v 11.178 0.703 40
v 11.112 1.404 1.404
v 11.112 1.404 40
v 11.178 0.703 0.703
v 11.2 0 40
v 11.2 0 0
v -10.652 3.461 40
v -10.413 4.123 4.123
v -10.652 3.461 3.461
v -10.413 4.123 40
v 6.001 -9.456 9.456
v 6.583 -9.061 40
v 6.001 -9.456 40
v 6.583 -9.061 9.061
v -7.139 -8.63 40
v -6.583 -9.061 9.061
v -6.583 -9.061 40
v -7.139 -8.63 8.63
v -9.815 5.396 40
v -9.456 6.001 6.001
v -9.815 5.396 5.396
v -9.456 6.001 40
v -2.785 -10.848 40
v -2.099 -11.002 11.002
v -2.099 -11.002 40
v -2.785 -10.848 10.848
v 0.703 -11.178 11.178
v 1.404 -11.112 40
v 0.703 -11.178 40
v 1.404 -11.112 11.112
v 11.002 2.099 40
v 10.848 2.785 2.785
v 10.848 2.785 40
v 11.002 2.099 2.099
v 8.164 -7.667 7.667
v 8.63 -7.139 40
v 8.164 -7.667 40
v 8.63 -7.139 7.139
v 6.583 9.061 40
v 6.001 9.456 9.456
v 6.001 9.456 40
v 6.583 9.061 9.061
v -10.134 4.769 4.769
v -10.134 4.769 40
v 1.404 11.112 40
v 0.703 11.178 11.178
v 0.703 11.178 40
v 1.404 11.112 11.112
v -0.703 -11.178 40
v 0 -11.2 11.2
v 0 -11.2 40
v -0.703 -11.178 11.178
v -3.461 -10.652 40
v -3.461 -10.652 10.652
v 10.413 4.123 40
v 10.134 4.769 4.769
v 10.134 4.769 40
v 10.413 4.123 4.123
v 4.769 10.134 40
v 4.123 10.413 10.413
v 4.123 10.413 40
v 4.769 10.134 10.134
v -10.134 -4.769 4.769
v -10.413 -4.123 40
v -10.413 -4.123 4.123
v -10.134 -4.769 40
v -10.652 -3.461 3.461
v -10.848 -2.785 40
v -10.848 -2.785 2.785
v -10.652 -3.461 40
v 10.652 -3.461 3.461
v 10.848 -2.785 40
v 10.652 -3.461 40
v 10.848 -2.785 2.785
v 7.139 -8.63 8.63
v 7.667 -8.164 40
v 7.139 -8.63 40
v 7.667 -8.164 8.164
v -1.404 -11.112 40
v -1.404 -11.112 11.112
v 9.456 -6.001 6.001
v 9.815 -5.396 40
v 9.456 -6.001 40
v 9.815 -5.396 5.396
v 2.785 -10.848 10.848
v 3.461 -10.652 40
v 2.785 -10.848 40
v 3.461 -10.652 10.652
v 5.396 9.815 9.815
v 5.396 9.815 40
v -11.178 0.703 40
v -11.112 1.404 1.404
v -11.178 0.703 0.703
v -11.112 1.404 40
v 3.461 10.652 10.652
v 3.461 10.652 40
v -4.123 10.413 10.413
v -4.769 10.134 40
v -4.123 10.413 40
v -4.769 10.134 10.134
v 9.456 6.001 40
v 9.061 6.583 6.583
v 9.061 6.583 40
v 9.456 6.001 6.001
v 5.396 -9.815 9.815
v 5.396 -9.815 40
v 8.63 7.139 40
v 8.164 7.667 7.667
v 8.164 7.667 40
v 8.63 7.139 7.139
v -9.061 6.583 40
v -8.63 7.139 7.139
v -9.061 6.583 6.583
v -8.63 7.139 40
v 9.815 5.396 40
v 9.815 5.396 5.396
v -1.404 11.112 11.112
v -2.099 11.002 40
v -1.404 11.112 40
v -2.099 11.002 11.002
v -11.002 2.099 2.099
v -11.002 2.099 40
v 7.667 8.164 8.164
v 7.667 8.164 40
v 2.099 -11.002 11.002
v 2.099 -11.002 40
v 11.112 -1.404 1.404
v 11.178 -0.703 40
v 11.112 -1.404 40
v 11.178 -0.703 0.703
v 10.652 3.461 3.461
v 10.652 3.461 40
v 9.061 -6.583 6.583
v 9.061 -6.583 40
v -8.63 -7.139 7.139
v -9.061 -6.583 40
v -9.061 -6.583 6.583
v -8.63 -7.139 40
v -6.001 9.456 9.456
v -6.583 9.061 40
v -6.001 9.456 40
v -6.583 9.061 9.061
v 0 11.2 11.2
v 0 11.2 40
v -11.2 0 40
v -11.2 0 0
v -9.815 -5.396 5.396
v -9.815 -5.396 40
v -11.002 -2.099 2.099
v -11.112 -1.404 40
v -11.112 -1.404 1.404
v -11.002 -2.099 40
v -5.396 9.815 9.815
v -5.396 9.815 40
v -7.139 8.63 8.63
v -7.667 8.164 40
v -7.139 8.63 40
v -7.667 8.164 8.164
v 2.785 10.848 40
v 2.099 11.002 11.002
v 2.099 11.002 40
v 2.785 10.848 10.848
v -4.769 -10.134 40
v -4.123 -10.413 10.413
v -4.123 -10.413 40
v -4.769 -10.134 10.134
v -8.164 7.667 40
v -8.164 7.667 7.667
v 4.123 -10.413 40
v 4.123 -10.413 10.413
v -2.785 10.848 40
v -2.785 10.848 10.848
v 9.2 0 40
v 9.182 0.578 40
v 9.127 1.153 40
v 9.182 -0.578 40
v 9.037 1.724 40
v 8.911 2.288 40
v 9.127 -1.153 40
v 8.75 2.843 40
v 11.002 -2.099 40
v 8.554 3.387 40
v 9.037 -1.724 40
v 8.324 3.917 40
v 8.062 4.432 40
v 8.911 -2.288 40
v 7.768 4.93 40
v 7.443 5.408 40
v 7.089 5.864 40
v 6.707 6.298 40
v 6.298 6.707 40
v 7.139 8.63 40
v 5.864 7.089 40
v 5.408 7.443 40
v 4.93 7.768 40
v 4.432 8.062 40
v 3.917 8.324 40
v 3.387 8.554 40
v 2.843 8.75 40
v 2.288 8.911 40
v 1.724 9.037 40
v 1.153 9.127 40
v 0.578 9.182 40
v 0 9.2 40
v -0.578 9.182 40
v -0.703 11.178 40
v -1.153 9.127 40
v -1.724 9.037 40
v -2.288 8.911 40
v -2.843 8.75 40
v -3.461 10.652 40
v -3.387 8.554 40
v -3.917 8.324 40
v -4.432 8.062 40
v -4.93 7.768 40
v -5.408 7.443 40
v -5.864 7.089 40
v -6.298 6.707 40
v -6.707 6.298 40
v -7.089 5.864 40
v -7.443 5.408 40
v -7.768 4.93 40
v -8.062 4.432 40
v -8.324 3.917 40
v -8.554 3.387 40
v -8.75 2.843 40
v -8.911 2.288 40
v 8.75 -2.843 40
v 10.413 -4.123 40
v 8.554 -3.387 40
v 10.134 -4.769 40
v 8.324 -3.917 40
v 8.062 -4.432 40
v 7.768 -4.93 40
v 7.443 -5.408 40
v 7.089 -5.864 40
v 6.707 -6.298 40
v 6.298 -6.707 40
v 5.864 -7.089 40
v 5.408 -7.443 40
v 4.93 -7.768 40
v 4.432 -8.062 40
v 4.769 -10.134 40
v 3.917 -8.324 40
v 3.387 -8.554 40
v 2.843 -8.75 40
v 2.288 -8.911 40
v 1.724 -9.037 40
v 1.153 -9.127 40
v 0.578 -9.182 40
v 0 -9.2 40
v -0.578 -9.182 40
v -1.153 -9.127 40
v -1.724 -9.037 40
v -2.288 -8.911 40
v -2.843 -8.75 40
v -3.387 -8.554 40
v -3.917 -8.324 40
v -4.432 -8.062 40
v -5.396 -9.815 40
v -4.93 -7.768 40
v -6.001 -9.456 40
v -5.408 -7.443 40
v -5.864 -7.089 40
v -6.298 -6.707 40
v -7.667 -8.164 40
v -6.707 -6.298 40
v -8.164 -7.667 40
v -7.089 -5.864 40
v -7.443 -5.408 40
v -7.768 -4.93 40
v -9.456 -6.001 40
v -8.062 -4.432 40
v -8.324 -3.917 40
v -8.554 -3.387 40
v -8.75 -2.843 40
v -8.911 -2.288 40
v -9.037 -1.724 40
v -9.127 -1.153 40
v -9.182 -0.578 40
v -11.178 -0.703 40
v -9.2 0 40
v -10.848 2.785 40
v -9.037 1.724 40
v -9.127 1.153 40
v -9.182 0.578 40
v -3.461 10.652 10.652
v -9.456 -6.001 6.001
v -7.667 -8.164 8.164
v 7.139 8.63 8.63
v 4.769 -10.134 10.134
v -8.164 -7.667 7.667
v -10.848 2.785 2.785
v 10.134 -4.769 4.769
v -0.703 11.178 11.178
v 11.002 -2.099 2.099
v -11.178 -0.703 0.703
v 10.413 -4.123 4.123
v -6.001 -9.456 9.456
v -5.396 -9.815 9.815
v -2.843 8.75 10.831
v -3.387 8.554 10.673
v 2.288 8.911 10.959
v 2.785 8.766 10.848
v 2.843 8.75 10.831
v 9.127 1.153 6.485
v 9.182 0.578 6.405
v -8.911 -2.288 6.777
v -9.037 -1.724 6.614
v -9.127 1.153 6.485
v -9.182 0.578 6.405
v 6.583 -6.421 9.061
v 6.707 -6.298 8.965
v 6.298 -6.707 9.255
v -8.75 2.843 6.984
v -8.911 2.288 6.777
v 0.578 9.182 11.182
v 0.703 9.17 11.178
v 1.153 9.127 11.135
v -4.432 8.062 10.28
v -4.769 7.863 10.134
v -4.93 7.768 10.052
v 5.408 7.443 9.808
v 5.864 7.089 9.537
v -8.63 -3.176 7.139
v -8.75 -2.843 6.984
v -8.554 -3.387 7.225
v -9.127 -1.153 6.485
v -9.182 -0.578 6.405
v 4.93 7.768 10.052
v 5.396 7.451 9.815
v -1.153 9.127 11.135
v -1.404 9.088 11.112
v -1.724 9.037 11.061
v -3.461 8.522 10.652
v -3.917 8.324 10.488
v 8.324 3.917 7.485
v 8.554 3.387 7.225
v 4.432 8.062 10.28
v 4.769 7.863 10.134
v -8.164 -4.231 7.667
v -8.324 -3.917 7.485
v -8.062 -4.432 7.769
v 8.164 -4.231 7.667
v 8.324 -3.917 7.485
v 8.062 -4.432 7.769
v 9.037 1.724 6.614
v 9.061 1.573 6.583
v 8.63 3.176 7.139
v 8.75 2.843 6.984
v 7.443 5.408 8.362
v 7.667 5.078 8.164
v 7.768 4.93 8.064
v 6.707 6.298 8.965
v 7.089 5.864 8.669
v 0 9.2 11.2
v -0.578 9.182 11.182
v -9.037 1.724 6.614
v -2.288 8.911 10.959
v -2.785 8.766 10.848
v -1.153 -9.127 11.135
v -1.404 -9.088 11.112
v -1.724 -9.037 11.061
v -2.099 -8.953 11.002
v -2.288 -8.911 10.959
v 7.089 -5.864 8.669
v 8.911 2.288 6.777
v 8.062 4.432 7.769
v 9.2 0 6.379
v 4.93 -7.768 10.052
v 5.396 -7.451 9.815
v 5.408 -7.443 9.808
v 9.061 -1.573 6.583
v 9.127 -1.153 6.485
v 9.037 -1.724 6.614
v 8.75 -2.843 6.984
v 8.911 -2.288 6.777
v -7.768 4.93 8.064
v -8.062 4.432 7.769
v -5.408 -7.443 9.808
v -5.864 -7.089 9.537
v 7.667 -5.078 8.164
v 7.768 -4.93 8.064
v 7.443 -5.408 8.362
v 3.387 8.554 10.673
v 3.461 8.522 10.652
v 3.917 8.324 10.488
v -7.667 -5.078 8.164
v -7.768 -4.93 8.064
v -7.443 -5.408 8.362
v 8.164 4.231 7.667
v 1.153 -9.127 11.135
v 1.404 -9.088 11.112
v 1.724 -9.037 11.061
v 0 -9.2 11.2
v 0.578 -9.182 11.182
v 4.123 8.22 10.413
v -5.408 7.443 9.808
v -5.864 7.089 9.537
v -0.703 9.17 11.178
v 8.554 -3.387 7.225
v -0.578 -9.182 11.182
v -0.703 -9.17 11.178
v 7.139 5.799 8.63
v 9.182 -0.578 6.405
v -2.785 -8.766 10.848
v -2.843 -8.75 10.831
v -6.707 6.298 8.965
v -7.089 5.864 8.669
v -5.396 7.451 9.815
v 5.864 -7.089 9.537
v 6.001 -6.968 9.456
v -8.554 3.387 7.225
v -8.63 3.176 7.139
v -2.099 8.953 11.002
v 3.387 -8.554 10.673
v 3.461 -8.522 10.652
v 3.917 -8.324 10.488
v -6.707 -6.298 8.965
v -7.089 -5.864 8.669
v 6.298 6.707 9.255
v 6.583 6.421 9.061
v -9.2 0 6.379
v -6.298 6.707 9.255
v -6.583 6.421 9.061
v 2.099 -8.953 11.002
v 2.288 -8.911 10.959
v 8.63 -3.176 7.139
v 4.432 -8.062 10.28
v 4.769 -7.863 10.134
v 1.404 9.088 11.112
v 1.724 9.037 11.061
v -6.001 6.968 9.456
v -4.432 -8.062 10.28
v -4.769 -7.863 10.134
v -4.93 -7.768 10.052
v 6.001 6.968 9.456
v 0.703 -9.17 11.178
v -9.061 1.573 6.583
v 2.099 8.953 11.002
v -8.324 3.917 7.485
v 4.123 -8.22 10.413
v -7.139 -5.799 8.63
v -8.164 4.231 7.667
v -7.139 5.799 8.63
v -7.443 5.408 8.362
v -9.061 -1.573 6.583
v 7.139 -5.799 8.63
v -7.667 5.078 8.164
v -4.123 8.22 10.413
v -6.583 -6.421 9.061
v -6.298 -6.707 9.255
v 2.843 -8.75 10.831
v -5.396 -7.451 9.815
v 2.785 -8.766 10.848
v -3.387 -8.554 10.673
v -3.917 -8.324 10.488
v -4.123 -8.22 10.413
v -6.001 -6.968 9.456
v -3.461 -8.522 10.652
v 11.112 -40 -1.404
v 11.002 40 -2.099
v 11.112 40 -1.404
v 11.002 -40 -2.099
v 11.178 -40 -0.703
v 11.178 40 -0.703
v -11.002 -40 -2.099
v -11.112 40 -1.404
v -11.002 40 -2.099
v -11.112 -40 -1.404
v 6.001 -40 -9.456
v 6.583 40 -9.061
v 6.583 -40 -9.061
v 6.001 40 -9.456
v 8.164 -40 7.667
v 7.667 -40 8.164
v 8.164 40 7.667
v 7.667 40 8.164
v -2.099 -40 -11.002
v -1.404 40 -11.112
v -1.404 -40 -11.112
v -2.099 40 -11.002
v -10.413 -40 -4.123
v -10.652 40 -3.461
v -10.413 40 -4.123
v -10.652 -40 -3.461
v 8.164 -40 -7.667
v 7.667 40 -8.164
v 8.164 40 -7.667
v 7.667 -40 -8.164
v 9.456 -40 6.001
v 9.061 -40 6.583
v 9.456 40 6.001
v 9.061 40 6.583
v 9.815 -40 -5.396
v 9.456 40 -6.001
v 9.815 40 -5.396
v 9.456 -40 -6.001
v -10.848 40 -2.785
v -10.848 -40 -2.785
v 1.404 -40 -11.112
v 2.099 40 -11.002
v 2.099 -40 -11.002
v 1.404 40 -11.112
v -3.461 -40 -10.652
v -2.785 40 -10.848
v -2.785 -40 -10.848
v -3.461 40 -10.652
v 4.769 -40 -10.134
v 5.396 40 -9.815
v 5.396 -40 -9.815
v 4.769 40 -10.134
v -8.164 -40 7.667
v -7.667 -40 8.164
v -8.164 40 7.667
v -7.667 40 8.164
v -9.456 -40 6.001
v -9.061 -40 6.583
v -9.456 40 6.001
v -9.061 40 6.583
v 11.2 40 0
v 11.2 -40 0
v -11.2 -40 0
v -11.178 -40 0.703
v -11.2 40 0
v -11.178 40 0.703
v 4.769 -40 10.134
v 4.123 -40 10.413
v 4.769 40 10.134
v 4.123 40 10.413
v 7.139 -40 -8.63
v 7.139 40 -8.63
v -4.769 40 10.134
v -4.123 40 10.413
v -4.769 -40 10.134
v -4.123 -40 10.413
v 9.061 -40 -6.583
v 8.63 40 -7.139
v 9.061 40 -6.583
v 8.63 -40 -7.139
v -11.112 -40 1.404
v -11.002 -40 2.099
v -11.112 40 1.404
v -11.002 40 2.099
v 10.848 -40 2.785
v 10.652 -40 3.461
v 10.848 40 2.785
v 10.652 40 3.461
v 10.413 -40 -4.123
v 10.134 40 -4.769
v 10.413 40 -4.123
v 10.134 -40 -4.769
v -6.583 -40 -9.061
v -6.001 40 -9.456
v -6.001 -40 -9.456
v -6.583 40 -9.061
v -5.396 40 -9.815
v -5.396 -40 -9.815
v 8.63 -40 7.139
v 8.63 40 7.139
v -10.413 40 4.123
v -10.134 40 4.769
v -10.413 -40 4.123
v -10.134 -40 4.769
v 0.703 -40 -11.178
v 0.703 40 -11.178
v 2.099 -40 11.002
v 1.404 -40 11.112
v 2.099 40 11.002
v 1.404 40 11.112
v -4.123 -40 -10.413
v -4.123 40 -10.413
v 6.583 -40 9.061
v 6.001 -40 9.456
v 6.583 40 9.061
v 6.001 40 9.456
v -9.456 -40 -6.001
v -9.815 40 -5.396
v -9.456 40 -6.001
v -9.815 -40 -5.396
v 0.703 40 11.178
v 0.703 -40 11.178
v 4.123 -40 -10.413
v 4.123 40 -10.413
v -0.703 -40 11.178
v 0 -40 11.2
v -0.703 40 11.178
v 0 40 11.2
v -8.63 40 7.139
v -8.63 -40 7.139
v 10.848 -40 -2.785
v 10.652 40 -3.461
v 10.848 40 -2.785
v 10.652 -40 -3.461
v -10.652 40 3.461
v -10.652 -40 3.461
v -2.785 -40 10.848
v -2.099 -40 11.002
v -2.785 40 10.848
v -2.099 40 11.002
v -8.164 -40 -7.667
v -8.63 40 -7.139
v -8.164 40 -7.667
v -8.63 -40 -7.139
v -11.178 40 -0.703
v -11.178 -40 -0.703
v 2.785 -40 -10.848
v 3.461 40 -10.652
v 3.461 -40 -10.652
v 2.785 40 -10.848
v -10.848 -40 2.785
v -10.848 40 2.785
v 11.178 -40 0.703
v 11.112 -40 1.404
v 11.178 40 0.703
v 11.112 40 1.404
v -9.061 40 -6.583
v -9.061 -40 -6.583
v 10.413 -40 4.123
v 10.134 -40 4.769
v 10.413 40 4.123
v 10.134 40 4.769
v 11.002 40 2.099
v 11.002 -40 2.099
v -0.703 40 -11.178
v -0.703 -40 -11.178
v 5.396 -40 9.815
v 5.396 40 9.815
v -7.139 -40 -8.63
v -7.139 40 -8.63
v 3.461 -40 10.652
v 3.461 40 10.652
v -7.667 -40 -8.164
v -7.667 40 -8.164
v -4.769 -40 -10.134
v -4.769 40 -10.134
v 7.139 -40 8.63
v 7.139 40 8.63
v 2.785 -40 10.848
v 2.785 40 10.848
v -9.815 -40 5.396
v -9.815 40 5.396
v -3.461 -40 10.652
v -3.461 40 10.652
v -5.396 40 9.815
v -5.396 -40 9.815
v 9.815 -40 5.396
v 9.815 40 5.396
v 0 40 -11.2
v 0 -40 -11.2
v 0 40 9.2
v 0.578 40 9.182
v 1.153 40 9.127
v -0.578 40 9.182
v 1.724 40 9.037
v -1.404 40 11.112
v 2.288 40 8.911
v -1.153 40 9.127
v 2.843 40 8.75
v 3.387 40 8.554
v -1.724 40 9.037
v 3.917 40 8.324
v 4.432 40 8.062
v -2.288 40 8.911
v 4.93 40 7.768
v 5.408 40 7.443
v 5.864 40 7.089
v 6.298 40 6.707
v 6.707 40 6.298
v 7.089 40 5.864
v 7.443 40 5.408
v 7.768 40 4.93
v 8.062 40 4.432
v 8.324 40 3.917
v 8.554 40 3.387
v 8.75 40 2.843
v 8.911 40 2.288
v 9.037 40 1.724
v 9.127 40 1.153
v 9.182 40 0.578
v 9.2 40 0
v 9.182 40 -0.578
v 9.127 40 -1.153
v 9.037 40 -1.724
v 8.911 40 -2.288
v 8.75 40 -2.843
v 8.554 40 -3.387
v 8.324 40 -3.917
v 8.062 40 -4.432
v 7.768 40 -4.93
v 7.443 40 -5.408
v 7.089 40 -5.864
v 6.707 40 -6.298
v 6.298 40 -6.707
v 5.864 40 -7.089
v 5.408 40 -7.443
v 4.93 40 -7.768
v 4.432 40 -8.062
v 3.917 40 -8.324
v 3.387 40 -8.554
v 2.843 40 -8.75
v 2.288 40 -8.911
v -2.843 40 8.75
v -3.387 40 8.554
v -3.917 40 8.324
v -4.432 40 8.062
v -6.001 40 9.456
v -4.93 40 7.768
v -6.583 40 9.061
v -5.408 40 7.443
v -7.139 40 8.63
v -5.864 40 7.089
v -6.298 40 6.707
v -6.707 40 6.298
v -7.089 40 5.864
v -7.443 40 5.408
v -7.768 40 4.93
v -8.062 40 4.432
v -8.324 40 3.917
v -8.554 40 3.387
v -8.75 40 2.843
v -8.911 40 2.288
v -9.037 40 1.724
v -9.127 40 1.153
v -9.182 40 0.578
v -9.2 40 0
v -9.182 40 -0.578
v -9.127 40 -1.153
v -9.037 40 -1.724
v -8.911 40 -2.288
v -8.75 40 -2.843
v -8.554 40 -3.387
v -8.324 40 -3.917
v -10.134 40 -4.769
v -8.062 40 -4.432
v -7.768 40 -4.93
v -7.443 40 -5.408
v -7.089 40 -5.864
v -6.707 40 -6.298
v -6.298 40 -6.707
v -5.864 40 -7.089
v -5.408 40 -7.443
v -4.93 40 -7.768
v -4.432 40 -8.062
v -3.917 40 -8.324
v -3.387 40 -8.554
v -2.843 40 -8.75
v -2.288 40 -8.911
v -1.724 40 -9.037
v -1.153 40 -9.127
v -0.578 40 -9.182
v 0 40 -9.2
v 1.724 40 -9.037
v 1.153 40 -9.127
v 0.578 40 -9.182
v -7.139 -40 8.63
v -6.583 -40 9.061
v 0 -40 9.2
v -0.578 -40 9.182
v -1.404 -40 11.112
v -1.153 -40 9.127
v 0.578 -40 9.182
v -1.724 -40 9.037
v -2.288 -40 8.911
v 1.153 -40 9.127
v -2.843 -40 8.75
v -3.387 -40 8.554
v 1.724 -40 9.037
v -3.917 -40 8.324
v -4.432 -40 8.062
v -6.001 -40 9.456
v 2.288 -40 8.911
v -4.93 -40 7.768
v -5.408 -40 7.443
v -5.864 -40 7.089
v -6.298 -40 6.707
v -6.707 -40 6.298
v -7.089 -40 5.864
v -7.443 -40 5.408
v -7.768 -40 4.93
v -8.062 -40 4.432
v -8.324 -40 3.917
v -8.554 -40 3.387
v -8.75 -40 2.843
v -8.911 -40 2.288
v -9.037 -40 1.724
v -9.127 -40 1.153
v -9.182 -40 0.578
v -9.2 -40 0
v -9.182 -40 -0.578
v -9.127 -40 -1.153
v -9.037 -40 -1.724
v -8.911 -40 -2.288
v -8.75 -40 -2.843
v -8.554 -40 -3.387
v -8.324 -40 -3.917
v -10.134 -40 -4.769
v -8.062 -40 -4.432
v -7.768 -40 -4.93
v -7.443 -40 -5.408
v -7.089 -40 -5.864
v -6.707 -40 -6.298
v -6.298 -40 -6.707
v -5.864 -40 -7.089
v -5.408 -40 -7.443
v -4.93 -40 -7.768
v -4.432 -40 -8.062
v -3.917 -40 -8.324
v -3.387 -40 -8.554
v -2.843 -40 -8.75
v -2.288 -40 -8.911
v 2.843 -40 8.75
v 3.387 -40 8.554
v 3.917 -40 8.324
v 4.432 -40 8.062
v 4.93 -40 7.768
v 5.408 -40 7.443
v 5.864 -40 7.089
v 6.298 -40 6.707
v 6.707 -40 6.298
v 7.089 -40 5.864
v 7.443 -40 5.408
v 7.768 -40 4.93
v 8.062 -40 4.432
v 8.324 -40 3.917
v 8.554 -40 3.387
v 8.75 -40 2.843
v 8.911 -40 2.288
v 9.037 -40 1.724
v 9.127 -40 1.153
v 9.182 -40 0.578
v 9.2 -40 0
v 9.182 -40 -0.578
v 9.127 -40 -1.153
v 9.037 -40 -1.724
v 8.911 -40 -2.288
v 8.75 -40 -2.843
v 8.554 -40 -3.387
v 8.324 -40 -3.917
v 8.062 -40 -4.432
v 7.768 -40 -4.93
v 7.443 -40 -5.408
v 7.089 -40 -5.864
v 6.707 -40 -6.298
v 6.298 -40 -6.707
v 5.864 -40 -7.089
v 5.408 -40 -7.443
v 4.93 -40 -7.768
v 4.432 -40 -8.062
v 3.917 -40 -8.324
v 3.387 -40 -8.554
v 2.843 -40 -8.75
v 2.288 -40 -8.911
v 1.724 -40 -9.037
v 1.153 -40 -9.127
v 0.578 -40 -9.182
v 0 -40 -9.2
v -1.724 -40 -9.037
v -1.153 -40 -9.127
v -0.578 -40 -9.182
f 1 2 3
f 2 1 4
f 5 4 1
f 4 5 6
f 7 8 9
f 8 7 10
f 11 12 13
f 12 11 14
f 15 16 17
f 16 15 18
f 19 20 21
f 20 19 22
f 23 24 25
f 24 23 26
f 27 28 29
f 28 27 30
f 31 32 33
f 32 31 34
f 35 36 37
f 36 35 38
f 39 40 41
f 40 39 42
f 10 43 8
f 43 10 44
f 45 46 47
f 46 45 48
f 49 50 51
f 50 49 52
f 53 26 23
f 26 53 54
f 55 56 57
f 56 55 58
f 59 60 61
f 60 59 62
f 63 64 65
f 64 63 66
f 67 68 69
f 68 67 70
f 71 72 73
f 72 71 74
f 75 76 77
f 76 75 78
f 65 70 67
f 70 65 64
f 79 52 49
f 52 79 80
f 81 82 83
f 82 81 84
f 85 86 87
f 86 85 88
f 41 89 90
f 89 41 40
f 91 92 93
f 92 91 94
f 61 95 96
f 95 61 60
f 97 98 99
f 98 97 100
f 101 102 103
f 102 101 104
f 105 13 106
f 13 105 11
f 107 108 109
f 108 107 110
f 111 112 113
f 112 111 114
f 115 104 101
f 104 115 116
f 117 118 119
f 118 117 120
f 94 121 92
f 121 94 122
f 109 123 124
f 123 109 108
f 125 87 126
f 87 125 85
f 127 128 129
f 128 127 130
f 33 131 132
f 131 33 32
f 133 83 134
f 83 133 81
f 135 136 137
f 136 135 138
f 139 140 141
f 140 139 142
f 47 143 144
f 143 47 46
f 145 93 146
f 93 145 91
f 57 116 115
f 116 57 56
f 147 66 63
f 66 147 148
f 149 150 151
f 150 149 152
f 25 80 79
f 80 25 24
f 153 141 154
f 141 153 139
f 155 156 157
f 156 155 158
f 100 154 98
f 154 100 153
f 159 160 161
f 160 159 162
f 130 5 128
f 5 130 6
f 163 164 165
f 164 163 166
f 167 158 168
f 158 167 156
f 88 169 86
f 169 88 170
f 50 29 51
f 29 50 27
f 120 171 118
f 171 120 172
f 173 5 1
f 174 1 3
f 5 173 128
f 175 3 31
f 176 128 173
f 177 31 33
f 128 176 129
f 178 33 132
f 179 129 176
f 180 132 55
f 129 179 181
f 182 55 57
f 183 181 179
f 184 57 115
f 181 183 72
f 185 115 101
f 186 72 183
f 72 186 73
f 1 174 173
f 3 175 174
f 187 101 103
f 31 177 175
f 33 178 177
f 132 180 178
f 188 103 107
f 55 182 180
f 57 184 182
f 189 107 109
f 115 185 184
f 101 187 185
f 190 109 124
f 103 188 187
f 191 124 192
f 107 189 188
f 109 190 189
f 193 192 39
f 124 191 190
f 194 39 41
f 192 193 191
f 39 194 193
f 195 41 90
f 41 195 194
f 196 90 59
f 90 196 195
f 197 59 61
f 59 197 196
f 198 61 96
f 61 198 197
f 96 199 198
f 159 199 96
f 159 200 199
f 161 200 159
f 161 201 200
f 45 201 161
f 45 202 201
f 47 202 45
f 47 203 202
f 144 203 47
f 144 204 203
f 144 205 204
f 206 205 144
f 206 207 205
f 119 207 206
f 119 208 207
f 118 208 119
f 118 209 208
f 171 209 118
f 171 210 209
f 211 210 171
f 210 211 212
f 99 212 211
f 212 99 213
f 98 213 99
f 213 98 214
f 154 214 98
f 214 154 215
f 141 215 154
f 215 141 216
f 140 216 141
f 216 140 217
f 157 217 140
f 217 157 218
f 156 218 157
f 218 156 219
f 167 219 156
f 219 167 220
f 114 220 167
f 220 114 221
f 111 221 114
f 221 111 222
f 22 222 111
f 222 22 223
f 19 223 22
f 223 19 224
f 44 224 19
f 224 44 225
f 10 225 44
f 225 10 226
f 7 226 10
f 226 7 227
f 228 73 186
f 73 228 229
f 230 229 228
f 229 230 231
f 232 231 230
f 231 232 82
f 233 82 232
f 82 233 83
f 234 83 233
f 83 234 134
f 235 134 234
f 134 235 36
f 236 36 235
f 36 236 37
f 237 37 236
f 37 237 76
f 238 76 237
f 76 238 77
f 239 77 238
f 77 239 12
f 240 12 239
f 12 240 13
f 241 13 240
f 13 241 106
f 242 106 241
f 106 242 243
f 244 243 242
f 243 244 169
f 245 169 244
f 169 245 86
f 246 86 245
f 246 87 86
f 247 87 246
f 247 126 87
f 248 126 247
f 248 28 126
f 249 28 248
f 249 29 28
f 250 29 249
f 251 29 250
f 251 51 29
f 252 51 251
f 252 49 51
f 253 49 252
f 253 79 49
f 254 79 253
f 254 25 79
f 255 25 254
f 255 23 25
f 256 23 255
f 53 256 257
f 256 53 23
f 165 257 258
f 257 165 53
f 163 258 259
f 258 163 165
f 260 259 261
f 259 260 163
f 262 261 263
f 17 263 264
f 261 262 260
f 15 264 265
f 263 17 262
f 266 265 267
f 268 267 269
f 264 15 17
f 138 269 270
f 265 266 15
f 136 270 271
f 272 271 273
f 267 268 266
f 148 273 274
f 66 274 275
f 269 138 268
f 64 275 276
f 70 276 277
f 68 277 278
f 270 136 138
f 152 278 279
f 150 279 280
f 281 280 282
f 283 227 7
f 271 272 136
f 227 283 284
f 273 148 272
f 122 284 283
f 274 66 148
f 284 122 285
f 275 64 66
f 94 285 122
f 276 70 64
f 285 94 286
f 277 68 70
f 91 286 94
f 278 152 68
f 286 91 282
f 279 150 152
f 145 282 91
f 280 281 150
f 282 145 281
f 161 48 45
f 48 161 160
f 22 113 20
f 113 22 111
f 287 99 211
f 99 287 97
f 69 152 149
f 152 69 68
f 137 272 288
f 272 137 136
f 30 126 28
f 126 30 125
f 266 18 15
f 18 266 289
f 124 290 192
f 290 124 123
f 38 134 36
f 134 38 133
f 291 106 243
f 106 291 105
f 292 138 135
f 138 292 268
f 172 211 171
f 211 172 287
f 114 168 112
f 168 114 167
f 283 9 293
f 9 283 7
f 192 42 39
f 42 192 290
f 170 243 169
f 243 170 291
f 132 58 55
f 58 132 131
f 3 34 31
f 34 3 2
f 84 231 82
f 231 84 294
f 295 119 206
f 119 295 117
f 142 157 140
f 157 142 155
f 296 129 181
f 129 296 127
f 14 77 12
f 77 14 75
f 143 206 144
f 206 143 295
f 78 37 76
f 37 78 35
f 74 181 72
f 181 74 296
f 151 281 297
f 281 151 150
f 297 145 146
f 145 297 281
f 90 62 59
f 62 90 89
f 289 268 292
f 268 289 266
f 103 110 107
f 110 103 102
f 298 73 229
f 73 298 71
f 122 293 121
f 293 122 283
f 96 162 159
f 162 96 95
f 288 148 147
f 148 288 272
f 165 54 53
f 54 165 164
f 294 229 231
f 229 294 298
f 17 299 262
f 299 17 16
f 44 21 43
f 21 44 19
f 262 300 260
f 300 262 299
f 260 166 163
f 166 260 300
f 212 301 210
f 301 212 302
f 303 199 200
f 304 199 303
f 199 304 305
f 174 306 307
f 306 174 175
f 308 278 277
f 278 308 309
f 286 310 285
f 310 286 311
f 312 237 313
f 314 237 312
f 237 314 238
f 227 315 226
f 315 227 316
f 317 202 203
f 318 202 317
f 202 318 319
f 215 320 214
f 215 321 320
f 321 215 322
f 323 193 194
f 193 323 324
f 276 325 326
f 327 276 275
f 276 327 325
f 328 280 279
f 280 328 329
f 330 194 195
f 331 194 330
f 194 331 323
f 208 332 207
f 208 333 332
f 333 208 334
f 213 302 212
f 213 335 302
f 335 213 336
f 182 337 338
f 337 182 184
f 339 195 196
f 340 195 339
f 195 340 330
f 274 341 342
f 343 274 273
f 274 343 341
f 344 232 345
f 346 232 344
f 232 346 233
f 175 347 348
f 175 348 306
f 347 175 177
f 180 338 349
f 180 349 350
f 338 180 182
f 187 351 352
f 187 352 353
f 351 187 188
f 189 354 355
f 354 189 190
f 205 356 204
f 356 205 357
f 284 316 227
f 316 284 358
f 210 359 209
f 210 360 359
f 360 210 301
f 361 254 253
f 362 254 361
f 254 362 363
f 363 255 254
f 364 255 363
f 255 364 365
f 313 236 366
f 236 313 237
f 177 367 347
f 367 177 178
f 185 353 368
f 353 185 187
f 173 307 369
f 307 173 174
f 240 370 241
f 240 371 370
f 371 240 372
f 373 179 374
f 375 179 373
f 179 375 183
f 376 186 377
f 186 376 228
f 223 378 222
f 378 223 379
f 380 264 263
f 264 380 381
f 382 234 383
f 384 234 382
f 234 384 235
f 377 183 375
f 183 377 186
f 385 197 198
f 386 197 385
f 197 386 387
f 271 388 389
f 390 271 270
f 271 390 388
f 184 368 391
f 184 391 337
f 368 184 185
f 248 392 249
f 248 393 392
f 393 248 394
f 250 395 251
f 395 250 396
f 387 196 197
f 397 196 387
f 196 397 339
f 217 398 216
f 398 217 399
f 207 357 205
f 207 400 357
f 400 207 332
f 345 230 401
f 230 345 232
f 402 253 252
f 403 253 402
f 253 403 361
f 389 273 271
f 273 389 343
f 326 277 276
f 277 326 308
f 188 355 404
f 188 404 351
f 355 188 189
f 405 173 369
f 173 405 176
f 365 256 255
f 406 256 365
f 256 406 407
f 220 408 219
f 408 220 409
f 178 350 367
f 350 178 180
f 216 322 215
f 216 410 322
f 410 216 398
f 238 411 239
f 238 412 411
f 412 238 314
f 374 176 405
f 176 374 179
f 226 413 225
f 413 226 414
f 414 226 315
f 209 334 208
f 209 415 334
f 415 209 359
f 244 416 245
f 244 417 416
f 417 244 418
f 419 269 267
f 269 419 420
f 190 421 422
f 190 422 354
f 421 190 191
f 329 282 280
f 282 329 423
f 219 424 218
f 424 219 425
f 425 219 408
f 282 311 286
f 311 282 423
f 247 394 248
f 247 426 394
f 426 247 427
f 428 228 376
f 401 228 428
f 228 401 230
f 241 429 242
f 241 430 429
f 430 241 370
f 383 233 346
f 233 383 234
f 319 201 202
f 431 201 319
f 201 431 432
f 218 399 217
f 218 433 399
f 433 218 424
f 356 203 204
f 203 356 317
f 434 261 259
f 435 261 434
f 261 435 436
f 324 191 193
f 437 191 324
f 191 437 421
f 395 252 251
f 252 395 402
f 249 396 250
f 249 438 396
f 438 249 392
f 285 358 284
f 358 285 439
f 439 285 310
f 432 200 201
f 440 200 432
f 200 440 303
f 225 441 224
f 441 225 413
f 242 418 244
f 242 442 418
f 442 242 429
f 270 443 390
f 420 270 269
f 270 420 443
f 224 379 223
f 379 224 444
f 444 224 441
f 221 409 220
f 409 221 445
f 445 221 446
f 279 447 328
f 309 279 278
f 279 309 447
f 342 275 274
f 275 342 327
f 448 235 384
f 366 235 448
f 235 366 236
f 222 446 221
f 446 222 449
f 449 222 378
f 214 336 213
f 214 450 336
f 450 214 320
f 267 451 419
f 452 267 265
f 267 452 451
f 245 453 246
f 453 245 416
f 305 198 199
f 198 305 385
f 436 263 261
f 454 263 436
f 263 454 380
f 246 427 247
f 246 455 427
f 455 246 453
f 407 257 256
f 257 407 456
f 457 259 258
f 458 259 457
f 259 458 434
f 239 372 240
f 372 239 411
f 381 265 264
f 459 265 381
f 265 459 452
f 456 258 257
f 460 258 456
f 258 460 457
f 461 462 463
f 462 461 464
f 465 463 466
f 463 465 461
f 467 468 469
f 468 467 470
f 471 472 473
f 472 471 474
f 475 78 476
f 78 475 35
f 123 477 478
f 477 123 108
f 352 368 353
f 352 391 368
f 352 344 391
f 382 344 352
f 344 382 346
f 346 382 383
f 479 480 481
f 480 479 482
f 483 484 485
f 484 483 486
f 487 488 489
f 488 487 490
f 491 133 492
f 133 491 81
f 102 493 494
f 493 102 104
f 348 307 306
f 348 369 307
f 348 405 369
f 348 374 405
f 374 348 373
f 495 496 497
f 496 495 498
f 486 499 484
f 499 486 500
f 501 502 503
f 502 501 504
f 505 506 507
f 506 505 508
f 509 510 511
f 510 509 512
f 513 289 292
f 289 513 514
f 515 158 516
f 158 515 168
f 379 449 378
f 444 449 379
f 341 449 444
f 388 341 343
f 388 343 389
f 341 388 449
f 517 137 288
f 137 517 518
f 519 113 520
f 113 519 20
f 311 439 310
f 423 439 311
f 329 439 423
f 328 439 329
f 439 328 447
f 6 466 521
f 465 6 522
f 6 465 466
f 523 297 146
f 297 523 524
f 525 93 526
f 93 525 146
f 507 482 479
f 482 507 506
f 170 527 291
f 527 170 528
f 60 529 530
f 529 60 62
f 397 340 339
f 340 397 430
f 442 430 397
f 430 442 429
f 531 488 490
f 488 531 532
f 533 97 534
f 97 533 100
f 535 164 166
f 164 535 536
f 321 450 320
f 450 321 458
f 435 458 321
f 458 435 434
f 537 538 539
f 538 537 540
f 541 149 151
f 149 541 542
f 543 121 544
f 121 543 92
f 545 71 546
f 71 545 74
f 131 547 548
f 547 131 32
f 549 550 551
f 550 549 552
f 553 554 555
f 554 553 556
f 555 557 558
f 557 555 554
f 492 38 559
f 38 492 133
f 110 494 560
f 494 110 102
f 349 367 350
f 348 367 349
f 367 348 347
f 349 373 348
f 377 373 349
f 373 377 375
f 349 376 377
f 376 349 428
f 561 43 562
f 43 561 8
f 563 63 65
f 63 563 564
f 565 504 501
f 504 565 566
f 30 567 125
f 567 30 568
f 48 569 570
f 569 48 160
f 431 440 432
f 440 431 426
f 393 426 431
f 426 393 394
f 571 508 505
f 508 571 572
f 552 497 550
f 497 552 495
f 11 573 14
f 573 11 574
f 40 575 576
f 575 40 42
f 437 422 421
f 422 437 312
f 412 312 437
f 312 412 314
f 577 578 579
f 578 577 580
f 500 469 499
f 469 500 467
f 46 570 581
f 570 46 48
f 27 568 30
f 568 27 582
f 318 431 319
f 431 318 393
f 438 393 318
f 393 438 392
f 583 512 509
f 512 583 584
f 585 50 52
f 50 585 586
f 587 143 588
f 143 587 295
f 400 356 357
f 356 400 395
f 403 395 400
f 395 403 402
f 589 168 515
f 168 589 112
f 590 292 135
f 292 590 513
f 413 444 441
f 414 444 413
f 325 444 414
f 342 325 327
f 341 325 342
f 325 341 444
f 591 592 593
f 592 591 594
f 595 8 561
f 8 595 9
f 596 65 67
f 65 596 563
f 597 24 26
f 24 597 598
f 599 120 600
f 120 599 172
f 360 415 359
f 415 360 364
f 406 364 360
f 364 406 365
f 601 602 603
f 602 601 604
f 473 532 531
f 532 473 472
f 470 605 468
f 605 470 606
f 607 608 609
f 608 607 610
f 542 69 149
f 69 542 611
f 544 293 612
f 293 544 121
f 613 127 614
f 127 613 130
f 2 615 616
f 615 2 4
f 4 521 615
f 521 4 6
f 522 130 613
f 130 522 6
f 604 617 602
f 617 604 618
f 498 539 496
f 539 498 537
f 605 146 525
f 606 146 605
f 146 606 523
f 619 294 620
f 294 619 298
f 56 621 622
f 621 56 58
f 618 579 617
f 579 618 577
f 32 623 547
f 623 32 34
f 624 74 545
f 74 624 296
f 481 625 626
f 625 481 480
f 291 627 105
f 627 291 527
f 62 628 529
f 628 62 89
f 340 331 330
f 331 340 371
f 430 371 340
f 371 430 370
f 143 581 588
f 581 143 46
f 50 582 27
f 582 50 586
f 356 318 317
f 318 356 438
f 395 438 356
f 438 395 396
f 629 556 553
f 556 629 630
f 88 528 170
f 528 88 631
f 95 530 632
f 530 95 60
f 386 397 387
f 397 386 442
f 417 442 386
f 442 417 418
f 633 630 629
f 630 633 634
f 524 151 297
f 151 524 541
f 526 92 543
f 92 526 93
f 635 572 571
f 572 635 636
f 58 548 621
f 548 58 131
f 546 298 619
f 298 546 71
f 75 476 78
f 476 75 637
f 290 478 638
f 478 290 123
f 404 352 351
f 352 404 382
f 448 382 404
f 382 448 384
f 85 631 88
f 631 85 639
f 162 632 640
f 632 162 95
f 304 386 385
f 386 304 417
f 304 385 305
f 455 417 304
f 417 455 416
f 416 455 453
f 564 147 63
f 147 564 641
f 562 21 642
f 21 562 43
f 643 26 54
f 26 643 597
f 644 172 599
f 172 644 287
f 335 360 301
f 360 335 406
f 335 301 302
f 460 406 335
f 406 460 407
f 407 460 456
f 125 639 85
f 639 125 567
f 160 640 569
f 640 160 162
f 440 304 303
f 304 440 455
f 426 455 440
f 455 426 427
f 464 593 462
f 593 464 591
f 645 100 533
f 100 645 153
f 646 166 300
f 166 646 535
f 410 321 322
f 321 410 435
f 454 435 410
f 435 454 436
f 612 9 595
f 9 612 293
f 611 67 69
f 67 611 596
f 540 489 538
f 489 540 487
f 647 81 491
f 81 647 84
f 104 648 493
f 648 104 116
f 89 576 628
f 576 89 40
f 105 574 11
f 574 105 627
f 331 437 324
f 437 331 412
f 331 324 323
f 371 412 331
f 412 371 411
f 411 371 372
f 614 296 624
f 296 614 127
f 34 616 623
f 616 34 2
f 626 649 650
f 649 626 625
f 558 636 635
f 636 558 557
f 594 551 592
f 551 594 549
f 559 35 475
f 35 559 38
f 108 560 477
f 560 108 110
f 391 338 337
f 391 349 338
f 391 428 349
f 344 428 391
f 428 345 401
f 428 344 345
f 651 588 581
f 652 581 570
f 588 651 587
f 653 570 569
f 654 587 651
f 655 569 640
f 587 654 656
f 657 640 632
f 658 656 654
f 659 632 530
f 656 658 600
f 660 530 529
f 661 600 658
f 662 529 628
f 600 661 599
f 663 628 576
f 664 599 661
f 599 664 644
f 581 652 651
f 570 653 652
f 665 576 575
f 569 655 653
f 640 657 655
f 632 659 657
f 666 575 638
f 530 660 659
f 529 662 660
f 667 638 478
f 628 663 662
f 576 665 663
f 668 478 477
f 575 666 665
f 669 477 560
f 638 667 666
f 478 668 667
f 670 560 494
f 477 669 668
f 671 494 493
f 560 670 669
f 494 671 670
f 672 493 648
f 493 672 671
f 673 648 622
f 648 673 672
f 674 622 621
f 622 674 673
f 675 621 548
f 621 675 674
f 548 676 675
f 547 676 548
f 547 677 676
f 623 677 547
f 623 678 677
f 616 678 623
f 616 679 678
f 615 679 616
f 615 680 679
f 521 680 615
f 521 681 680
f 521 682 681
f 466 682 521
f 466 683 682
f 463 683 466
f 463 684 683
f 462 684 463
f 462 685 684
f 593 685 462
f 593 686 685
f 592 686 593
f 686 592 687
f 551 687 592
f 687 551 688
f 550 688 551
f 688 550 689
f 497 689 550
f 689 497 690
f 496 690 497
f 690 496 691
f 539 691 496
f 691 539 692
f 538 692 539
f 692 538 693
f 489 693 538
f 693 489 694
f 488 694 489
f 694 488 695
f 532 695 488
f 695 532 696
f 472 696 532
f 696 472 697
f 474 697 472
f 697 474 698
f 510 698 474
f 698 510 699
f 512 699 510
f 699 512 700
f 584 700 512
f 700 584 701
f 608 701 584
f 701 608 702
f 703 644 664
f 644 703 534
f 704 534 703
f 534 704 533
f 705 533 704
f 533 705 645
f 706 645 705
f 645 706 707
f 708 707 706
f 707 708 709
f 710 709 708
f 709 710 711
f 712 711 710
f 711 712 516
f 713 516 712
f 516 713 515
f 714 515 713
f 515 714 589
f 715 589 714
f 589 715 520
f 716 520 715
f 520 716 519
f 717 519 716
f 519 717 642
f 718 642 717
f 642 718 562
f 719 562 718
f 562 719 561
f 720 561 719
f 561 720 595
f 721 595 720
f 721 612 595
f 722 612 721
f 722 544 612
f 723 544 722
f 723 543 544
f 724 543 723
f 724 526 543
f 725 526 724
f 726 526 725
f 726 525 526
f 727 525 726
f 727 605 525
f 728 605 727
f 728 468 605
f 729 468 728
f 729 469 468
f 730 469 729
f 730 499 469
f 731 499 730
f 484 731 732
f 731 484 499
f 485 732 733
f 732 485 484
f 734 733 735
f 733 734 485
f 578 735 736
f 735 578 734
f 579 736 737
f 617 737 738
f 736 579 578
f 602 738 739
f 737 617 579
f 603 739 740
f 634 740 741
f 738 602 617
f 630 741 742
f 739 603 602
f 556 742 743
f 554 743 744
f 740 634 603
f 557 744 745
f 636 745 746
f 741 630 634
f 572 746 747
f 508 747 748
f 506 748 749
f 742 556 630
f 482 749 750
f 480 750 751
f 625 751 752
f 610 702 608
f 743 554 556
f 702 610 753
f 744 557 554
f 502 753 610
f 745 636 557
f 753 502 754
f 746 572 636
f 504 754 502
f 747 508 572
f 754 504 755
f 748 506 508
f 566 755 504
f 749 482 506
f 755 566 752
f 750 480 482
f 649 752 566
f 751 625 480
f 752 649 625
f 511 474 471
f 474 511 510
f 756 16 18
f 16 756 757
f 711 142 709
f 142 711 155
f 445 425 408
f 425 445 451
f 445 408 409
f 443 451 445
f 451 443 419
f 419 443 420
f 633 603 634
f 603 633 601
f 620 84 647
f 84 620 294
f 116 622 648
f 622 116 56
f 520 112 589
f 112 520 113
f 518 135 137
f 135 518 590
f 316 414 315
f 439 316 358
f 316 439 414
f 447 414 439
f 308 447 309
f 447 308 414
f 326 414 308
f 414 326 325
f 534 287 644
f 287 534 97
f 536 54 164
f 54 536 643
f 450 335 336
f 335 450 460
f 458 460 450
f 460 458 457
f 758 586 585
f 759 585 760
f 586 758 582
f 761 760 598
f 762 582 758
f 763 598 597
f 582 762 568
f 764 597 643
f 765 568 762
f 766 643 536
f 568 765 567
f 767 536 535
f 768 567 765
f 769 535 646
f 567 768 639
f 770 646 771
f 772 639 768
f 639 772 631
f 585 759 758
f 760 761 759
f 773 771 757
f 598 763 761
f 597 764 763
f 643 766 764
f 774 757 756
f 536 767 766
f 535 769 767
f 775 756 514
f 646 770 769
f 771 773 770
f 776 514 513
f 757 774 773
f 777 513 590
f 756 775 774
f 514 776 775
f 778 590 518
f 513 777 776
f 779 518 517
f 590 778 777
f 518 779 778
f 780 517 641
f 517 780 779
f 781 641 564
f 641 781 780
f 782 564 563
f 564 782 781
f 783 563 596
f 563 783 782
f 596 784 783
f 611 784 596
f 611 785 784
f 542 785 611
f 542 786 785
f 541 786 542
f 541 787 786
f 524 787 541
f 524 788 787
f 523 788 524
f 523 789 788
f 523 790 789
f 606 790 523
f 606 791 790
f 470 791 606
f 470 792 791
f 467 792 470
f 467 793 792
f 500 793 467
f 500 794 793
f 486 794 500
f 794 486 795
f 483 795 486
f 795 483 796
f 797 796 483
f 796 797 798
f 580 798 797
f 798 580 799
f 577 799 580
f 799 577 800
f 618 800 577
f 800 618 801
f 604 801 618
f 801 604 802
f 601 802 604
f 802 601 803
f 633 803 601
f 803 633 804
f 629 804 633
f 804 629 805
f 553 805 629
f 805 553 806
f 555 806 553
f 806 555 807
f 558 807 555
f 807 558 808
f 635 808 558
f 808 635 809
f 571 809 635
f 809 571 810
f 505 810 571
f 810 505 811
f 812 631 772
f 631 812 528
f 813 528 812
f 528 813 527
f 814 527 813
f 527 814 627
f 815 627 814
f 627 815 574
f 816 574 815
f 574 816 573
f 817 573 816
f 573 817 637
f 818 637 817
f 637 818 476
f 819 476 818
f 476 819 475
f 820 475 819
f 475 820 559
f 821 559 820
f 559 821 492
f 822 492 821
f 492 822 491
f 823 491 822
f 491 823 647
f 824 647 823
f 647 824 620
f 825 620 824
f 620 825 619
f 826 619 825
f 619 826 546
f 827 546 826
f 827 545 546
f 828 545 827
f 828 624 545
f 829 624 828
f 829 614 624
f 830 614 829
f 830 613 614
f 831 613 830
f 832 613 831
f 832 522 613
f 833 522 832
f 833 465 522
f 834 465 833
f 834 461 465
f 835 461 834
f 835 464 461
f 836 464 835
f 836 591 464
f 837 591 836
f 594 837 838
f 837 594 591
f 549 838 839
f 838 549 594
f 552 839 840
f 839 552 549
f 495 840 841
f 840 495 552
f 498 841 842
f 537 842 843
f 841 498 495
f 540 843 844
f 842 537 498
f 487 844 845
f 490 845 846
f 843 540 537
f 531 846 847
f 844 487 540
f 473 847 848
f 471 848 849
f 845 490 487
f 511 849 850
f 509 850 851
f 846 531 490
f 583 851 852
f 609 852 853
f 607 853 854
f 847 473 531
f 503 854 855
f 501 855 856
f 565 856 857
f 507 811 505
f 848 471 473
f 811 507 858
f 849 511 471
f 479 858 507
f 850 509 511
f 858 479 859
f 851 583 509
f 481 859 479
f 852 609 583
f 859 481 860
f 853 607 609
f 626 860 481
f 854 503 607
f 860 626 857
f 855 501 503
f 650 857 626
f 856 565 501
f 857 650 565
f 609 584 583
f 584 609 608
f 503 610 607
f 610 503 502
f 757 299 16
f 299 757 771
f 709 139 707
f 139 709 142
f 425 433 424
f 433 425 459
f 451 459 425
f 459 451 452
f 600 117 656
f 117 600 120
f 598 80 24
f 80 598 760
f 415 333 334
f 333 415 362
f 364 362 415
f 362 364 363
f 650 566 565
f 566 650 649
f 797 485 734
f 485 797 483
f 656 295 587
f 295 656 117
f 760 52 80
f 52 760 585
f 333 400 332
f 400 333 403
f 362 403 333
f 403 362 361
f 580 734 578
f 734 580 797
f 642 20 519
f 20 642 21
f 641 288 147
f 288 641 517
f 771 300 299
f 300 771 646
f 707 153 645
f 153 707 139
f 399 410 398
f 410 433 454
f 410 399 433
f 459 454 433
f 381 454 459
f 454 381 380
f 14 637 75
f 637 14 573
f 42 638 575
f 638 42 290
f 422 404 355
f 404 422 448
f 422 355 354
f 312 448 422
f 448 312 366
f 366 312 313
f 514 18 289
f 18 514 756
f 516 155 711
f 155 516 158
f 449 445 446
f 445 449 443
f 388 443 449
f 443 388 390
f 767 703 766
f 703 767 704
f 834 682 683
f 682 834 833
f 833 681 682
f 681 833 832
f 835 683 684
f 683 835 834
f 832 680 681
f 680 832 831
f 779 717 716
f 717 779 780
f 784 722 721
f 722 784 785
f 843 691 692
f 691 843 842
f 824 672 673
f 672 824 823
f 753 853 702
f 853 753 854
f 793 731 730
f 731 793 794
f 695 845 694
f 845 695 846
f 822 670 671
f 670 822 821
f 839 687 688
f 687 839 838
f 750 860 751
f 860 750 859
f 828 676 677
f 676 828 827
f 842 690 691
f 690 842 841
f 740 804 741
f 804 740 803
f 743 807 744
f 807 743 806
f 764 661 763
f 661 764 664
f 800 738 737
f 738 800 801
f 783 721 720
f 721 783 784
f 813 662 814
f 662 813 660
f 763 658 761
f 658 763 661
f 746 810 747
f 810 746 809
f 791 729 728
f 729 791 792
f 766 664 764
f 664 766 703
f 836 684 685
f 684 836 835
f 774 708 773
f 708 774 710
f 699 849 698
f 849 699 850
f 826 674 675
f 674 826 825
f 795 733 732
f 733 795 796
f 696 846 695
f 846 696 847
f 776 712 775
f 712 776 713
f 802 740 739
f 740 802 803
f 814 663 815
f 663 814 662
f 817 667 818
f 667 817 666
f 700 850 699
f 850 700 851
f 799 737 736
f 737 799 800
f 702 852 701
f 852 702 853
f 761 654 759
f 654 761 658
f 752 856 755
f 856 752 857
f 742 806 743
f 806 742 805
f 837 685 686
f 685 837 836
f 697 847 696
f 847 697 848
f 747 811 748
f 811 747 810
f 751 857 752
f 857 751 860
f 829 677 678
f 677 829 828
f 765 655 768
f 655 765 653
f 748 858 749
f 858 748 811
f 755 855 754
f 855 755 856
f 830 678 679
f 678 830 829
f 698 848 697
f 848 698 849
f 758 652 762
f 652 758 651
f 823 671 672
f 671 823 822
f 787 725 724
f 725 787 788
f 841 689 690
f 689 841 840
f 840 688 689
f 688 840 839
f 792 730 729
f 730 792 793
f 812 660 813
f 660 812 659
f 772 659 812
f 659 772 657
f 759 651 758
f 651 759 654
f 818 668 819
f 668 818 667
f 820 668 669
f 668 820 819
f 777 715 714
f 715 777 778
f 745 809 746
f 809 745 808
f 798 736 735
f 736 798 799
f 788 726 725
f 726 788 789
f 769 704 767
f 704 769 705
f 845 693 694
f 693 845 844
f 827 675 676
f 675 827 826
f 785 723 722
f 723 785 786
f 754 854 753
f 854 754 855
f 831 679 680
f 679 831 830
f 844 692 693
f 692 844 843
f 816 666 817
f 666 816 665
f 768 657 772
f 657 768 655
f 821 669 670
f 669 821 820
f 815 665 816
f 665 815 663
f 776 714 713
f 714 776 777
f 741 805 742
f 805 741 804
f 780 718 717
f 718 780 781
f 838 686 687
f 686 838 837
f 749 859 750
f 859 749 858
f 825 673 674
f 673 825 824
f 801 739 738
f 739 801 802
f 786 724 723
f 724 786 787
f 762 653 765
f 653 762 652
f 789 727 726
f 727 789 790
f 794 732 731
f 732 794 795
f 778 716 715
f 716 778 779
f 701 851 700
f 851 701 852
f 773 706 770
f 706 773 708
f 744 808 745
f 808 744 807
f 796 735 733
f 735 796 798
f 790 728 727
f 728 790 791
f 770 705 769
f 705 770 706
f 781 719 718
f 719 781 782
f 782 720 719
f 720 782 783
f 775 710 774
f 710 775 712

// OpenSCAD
$fa = 1;
$fs = .4;
$fn = 100;


Di = 18.4;
Do = 18.4 + 4;
Ln = 40;

difference(){
    union(){
        translate([0, -Ln, 0])
            rotate([270, 0, 0])
                cylinder(Ln * 2, Do / 2, Do / 2);

        difference(){
            cylinder(Ln, Do / 2, Do / 2);
            cylinder(Ln, Di / 2, Di / 2);
        }
    }
    
    translate([0, -Ln, 0])
        rotate([270, 0, 0])
            cylinder(Ln * 2, Di / 2, Di / 2);
}
